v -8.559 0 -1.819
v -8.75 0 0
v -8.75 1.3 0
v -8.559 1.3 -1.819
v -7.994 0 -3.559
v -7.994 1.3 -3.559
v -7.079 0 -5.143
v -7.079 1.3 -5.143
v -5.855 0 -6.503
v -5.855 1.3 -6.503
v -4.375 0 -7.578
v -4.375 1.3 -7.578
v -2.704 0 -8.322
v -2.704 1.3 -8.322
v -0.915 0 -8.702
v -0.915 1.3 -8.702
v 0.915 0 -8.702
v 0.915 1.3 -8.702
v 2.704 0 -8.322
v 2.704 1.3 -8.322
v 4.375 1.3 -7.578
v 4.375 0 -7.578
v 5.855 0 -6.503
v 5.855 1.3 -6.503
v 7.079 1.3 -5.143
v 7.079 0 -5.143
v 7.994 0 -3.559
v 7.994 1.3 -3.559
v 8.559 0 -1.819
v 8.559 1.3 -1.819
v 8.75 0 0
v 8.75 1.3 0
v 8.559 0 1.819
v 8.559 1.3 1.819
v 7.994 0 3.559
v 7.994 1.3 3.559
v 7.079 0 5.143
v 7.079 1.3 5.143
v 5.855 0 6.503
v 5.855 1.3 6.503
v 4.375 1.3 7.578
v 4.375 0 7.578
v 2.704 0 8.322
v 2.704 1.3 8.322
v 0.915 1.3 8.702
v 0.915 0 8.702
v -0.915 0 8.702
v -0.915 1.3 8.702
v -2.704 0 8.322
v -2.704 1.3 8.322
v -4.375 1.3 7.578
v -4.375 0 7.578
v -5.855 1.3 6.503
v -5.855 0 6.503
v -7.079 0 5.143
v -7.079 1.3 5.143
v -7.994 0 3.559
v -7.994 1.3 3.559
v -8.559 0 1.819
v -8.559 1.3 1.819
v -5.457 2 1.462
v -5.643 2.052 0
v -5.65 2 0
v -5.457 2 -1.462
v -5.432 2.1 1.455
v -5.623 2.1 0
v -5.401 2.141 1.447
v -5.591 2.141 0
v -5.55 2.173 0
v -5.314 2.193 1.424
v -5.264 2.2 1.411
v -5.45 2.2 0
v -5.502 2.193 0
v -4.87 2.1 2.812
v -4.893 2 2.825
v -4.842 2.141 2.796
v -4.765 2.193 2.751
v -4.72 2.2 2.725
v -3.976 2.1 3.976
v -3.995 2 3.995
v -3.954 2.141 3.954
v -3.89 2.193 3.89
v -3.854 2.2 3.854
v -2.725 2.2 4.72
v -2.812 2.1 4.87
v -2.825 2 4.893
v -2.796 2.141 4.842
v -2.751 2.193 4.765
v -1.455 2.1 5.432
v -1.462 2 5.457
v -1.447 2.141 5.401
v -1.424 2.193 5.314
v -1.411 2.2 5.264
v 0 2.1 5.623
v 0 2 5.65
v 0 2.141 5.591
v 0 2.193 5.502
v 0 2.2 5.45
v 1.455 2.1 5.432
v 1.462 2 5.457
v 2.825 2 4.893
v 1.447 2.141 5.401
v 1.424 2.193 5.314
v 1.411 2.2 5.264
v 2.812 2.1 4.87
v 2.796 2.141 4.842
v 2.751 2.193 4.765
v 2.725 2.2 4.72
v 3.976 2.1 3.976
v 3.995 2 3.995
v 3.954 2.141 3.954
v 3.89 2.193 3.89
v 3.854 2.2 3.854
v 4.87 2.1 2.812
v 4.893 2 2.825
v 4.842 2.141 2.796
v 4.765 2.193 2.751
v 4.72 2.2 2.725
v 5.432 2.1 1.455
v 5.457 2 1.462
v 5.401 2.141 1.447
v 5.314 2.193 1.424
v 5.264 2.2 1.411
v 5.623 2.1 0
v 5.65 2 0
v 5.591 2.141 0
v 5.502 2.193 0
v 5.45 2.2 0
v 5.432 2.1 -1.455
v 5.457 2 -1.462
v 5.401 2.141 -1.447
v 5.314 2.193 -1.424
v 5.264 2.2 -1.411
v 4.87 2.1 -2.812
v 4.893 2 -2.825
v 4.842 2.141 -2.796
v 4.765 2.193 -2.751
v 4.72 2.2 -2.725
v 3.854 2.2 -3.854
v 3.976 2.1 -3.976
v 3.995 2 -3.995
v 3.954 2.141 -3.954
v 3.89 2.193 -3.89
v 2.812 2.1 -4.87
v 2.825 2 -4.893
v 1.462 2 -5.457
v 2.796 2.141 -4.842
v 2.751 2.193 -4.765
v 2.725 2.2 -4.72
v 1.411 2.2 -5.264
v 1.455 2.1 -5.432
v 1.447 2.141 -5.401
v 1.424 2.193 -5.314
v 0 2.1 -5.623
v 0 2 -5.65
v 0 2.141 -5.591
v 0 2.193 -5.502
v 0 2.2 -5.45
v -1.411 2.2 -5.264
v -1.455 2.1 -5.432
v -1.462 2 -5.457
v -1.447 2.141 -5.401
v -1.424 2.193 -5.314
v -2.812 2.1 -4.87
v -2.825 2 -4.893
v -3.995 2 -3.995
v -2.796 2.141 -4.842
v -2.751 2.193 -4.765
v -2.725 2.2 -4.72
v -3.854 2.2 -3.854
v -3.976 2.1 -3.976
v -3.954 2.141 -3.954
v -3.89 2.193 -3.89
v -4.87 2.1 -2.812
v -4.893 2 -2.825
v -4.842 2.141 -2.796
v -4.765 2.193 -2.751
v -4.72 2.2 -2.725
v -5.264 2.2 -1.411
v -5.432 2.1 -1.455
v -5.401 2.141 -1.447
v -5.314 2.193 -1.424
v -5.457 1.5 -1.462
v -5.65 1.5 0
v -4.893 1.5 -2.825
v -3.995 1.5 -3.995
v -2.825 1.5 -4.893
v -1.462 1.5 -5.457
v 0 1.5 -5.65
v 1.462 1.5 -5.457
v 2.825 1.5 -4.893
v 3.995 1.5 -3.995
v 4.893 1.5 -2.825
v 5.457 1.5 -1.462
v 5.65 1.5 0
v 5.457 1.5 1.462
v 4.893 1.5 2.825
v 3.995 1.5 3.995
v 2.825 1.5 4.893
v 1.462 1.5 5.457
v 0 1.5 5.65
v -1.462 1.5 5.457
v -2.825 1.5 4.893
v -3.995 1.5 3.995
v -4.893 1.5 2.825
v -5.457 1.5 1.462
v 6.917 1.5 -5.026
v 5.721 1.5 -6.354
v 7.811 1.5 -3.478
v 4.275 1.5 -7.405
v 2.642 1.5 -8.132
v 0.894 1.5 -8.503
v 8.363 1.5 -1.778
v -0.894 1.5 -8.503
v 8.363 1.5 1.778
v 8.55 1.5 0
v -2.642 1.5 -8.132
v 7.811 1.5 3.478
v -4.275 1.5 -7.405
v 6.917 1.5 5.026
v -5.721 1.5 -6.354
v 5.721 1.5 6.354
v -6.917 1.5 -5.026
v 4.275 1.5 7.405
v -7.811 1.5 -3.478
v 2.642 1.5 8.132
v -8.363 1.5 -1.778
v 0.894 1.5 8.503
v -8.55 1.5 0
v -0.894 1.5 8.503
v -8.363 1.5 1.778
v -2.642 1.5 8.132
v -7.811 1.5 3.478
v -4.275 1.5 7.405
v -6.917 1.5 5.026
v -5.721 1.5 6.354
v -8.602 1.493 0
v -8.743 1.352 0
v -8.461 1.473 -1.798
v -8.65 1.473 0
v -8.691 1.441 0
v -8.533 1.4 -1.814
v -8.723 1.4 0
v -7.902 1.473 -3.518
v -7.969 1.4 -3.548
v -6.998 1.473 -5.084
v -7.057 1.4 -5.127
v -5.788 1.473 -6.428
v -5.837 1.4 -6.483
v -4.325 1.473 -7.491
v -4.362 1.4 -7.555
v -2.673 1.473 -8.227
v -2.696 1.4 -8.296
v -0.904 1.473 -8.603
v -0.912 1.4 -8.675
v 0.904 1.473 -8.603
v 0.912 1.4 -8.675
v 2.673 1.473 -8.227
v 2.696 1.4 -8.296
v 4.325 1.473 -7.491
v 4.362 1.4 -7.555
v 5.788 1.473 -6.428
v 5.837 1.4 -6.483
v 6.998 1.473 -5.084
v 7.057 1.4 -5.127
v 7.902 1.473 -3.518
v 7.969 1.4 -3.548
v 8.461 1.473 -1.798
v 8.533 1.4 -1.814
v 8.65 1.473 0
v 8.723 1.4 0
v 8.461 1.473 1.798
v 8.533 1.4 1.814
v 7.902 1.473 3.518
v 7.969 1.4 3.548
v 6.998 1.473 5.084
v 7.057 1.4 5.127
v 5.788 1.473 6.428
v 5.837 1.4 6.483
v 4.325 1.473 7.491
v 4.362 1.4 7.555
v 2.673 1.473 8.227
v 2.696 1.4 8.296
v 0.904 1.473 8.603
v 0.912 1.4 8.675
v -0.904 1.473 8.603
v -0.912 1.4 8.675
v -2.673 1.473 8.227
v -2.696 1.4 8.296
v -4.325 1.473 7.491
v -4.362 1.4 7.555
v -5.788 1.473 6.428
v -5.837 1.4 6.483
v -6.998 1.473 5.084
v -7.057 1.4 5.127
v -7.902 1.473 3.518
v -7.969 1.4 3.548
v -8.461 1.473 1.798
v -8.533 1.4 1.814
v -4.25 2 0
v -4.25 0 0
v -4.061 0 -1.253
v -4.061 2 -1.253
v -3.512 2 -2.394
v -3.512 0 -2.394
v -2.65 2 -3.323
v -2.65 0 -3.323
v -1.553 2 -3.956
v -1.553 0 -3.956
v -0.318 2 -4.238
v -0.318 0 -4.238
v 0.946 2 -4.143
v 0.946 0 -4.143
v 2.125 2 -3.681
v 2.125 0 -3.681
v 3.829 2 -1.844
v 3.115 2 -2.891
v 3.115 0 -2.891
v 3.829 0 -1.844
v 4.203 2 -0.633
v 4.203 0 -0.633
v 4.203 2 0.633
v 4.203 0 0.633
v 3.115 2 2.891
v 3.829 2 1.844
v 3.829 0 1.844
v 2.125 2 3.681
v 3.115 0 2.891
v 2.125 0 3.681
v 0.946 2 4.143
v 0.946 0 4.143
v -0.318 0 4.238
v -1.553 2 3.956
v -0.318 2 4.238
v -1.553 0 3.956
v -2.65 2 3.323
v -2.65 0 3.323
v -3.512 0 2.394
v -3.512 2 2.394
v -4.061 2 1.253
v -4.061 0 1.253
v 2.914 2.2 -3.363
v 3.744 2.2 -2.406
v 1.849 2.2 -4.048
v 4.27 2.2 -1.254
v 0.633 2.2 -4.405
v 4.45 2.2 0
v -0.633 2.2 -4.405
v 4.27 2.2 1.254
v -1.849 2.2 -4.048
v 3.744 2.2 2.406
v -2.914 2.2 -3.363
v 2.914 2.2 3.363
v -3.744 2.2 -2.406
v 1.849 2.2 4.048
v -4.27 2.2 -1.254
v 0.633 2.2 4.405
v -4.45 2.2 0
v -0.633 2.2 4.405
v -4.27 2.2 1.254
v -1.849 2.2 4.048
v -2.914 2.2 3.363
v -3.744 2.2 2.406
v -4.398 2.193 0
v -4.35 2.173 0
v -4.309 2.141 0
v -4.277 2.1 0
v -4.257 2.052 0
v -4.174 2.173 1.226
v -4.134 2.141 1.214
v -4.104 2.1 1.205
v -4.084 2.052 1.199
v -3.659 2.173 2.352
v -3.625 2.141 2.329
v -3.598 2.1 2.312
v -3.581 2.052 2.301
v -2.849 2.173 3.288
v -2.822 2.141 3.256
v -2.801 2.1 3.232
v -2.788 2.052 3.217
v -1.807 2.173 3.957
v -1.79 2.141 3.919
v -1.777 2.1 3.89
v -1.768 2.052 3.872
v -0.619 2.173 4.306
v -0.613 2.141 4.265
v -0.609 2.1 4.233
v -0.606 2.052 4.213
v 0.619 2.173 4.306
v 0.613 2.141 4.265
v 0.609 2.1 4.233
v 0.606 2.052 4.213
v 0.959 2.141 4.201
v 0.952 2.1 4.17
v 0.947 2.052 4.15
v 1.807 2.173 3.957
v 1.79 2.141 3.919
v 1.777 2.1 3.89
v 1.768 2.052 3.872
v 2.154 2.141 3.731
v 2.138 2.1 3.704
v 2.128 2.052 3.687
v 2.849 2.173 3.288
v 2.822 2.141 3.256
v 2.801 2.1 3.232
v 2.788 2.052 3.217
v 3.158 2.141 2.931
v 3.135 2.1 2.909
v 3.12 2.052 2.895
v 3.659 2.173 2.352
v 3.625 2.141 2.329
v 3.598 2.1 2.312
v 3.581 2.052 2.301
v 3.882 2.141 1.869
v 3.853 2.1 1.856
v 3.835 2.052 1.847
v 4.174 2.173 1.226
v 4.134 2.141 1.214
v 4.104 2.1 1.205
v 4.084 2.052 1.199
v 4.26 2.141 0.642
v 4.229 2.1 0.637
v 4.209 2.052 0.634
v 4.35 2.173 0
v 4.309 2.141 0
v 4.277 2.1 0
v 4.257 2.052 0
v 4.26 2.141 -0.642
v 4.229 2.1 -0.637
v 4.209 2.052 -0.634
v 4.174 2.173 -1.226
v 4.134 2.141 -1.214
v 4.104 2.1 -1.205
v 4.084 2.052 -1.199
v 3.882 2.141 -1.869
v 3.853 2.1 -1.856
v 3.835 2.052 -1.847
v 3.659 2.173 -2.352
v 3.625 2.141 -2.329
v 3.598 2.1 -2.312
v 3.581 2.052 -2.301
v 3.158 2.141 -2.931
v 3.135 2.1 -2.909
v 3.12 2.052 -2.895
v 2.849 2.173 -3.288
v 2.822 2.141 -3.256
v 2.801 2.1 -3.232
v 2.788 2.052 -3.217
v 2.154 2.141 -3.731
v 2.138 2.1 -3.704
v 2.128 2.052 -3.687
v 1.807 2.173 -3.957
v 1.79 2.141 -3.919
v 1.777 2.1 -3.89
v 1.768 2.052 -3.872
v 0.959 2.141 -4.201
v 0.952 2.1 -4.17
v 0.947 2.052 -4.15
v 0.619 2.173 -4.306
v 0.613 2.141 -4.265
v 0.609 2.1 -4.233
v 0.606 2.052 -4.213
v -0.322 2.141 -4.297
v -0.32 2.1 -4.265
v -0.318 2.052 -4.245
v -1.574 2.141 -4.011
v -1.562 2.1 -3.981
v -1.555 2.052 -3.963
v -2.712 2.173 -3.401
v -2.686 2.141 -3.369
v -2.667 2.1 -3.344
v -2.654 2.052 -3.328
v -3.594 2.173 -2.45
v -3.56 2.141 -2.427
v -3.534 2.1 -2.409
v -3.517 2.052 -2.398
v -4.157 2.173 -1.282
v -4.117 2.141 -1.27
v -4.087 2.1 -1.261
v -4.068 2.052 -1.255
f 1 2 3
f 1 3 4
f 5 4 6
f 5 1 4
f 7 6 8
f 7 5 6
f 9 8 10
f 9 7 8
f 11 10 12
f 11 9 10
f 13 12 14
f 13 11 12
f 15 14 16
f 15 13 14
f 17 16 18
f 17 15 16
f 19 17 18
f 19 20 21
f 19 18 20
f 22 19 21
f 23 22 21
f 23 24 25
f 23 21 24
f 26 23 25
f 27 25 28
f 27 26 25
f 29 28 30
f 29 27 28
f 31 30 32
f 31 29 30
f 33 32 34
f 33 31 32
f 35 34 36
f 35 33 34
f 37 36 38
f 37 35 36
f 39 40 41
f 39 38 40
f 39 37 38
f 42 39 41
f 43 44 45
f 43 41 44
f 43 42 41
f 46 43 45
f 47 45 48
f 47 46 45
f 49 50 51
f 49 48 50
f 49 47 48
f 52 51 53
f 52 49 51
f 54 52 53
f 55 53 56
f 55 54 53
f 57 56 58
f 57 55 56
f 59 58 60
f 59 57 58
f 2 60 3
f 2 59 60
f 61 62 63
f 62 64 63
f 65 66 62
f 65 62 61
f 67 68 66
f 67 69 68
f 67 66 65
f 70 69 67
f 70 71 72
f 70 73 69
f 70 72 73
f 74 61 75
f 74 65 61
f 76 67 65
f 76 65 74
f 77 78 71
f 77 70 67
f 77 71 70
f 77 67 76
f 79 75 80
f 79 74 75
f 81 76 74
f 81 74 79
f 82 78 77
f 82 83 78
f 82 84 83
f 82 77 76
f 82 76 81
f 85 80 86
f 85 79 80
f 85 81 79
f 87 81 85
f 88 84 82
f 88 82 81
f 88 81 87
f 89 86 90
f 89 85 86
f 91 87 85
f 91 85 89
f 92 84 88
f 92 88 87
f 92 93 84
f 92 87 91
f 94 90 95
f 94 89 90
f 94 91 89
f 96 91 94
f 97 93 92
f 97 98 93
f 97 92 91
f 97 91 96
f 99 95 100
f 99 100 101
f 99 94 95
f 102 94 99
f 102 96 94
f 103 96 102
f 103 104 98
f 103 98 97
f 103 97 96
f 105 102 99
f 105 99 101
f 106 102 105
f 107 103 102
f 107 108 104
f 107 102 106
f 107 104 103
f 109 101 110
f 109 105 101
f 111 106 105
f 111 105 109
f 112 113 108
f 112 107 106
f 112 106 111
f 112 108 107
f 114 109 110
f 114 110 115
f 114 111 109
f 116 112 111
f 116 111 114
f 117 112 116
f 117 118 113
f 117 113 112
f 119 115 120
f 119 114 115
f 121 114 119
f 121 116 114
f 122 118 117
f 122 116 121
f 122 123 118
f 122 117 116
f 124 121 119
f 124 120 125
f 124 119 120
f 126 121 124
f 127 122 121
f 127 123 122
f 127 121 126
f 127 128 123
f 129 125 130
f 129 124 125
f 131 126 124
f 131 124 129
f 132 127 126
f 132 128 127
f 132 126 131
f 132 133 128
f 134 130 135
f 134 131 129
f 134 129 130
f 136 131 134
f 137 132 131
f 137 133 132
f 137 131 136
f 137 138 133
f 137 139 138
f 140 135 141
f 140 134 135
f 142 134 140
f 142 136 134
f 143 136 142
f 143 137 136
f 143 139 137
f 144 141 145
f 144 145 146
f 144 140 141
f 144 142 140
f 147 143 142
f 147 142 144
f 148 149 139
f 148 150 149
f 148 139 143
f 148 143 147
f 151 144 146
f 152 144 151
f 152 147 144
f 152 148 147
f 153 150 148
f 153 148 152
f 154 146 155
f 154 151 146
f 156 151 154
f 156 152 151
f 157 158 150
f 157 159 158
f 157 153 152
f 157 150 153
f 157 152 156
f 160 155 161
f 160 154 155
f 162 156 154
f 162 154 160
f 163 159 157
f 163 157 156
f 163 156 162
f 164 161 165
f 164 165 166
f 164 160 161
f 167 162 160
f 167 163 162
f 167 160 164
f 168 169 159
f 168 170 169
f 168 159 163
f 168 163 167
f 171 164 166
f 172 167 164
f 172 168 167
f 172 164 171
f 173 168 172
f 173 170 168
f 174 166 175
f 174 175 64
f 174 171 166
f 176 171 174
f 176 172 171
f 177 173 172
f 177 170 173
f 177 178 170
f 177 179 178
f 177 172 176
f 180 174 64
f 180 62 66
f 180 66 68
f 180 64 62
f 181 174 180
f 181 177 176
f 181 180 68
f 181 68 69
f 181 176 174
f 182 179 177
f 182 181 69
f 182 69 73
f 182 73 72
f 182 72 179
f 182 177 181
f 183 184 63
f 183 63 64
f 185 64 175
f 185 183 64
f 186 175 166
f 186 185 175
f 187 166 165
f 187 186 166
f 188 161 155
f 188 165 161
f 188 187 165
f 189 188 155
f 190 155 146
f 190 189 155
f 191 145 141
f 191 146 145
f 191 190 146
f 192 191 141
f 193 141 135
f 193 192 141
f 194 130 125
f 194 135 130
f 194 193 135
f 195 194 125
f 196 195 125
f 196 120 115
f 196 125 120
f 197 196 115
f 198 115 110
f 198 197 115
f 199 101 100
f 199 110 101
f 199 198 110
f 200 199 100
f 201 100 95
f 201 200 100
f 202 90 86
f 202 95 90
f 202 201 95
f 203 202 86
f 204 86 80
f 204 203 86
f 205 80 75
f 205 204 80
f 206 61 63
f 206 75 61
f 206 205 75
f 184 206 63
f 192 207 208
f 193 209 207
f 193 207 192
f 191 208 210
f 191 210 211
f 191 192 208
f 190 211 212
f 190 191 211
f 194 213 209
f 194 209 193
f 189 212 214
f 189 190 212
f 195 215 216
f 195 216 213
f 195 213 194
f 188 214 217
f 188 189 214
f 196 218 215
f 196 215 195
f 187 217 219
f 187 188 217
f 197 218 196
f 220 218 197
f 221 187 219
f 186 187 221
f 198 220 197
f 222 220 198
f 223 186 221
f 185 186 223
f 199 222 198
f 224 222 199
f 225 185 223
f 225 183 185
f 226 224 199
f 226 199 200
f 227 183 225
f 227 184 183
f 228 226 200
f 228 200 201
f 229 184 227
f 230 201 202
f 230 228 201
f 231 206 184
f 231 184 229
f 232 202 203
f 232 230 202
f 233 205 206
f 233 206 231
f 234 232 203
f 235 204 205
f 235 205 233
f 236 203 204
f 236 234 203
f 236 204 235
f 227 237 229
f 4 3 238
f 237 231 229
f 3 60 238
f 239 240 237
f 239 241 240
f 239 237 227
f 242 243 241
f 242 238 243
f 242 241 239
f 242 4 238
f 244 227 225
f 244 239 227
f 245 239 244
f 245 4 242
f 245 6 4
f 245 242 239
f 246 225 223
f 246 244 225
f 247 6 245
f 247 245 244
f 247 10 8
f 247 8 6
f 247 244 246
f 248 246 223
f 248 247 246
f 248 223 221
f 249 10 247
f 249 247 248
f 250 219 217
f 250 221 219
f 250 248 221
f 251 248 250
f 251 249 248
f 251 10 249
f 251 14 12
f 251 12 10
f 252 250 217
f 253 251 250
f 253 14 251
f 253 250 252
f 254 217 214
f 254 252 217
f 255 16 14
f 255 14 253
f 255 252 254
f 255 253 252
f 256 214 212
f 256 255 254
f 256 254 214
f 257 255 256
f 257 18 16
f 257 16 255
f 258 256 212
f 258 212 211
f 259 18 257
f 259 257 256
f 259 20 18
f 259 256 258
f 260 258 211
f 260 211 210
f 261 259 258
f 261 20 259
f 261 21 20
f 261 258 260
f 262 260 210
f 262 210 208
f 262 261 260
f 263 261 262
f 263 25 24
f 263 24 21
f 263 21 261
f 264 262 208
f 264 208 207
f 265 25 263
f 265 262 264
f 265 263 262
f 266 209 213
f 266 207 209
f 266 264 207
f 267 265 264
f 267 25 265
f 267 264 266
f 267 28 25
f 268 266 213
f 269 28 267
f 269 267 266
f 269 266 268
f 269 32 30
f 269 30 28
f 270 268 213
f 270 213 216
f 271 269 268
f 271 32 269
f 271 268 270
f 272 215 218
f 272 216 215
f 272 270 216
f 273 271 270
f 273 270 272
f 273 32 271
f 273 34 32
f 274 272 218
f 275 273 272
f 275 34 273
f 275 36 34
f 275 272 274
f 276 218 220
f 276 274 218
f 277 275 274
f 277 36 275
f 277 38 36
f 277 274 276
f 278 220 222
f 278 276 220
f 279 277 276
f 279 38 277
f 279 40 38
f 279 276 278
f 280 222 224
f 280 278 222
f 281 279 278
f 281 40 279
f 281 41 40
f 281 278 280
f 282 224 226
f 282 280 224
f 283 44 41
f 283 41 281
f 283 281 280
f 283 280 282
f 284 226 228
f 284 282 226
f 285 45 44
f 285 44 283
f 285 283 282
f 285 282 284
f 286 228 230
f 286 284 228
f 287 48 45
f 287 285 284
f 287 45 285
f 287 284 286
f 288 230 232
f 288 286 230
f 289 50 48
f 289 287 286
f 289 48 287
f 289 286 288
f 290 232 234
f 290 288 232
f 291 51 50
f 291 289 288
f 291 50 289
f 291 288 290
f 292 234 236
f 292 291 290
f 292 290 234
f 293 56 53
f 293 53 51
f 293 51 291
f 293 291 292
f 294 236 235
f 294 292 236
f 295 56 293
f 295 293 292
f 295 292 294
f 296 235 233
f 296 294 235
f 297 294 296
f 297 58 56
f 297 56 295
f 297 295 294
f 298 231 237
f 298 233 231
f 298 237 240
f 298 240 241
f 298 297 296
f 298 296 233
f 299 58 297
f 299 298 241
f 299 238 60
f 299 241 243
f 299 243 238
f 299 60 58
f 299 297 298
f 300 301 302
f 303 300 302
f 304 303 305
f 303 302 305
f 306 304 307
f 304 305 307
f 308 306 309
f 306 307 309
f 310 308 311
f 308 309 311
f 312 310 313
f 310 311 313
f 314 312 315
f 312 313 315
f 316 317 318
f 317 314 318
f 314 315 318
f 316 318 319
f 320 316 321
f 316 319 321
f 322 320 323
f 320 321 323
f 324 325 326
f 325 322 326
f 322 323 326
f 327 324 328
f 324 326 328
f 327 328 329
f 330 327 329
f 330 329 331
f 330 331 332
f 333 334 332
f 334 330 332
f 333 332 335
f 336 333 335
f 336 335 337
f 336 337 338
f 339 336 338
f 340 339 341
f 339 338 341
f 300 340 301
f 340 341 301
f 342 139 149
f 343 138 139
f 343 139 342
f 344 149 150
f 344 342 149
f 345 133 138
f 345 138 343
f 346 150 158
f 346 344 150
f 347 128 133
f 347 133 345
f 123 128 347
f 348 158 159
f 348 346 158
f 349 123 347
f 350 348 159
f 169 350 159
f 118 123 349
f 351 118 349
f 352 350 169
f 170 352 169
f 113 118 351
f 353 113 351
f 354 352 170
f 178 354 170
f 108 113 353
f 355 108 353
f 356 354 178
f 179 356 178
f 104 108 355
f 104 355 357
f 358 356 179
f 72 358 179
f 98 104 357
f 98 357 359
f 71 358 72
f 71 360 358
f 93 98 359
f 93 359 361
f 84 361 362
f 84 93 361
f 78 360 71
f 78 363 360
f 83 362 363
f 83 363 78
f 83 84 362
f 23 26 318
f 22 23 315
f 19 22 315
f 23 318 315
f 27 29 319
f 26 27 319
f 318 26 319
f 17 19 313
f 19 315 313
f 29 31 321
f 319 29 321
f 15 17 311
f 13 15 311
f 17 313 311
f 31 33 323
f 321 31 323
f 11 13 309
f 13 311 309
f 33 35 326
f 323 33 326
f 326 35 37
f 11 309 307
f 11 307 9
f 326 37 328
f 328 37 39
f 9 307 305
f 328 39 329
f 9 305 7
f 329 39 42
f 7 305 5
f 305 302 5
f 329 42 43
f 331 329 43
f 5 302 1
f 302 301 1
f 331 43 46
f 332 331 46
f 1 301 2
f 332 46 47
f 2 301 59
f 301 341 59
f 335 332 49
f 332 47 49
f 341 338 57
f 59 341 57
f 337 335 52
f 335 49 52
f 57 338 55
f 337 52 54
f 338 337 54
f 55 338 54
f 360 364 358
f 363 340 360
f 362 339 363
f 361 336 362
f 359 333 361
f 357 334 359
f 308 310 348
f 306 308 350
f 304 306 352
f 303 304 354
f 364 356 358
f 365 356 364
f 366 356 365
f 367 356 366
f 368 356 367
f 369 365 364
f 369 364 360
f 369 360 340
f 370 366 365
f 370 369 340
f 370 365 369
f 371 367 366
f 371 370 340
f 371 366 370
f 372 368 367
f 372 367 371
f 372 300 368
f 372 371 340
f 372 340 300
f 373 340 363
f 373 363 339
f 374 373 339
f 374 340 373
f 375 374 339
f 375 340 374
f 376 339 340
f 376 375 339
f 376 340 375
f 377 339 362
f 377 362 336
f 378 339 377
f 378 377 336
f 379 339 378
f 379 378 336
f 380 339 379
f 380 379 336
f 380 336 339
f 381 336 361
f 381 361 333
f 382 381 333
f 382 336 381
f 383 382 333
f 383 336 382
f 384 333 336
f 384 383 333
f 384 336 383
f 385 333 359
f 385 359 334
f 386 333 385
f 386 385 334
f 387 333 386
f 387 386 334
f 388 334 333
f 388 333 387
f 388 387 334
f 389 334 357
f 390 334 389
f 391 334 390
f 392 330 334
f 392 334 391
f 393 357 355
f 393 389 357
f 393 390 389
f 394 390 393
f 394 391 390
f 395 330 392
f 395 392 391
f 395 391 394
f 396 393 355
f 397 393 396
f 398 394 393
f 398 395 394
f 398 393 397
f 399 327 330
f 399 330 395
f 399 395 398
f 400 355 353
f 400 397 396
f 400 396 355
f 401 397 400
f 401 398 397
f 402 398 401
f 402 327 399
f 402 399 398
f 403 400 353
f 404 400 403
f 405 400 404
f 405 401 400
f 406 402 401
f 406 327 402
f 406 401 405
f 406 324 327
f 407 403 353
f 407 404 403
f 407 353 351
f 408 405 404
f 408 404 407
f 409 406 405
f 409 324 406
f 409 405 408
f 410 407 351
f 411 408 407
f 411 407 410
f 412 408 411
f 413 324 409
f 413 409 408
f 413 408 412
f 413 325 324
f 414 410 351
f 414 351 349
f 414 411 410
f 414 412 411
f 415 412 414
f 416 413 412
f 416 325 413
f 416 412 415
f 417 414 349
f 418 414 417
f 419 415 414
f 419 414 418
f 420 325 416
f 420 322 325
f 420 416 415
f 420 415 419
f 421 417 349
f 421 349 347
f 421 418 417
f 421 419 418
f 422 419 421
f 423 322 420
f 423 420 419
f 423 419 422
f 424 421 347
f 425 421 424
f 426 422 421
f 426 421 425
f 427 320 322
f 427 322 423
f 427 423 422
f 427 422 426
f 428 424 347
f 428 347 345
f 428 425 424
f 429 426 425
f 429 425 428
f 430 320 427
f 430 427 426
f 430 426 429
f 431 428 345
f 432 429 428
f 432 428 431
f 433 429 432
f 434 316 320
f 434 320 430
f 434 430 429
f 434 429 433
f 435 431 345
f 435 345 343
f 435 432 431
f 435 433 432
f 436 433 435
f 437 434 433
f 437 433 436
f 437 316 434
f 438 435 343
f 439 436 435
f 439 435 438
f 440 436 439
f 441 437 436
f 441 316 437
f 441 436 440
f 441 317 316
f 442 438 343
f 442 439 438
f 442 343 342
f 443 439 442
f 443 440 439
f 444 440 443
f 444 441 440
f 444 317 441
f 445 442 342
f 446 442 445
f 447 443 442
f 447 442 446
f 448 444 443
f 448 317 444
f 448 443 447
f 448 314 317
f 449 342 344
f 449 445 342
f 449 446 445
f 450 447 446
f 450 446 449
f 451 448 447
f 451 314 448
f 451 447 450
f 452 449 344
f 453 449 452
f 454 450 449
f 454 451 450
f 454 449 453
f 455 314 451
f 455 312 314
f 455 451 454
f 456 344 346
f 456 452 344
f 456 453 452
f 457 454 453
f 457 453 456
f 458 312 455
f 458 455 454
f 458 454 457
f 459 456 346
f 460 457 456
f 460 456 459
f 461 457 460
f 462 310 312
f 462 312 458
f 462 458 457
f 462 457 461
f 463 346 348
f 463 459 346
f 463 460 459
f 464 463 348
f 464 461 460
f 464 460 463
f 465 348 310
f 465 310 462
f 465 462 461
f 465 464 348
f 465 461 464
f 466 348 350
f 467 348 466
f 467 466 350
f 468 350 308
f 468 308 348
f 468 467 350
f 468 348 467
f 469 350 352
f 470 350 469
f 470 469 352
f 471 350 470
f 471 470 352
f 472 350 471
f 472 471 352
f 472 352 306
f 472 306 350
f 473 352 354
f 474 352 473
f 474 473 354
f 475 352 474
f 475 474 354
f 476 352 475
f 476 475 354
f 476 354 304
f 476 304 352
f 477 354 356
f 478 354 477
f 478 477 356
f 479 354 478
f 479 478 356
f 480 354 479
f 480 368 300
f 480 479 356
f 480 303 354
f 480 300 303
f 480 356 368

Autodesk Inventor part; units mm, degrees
ref_plane "YZ Plane" through (0, 0, 0) normal (1, 0, 0) x (0, 1, 0)
ref_plane "XZ Plane" through (0, 0, 0) normal (0, 1, 0) x (-1, 0, 0)
ref_plane "XY Plane" through (0, 0, 0) normal (0, 0, 1) x (1, 0, 0)
sketch "Sketch1" plane through (0, 0, 0) normal (0, 1, 0) x (-1, 0, 0)
  circle A0 centre (0, 0) radius 8.75
  circle A1 centre (0, 0) radius 5.65
  circle A2 centre (0, 0) radius 4.25
  dimension "d0" = 17.5
  dimension "d1" = 11.3
  dimension "d2" = 8.5
extrude "Extrusion1" add sketch "Sketch1" along normal blind 2.2 contours A1
extrude "Extrusion2" add sketch "Sketch1" along normal blind 1.5 contours A0
fillet "Fillet1" radius 0.2 3 edges at (4.25, 2.2, 0) (5.65, 2.2, 0) (8.75, 1.5, 0)
properties part number "ZKE-Term-Solid-Shim" material "ABS Plastic"
